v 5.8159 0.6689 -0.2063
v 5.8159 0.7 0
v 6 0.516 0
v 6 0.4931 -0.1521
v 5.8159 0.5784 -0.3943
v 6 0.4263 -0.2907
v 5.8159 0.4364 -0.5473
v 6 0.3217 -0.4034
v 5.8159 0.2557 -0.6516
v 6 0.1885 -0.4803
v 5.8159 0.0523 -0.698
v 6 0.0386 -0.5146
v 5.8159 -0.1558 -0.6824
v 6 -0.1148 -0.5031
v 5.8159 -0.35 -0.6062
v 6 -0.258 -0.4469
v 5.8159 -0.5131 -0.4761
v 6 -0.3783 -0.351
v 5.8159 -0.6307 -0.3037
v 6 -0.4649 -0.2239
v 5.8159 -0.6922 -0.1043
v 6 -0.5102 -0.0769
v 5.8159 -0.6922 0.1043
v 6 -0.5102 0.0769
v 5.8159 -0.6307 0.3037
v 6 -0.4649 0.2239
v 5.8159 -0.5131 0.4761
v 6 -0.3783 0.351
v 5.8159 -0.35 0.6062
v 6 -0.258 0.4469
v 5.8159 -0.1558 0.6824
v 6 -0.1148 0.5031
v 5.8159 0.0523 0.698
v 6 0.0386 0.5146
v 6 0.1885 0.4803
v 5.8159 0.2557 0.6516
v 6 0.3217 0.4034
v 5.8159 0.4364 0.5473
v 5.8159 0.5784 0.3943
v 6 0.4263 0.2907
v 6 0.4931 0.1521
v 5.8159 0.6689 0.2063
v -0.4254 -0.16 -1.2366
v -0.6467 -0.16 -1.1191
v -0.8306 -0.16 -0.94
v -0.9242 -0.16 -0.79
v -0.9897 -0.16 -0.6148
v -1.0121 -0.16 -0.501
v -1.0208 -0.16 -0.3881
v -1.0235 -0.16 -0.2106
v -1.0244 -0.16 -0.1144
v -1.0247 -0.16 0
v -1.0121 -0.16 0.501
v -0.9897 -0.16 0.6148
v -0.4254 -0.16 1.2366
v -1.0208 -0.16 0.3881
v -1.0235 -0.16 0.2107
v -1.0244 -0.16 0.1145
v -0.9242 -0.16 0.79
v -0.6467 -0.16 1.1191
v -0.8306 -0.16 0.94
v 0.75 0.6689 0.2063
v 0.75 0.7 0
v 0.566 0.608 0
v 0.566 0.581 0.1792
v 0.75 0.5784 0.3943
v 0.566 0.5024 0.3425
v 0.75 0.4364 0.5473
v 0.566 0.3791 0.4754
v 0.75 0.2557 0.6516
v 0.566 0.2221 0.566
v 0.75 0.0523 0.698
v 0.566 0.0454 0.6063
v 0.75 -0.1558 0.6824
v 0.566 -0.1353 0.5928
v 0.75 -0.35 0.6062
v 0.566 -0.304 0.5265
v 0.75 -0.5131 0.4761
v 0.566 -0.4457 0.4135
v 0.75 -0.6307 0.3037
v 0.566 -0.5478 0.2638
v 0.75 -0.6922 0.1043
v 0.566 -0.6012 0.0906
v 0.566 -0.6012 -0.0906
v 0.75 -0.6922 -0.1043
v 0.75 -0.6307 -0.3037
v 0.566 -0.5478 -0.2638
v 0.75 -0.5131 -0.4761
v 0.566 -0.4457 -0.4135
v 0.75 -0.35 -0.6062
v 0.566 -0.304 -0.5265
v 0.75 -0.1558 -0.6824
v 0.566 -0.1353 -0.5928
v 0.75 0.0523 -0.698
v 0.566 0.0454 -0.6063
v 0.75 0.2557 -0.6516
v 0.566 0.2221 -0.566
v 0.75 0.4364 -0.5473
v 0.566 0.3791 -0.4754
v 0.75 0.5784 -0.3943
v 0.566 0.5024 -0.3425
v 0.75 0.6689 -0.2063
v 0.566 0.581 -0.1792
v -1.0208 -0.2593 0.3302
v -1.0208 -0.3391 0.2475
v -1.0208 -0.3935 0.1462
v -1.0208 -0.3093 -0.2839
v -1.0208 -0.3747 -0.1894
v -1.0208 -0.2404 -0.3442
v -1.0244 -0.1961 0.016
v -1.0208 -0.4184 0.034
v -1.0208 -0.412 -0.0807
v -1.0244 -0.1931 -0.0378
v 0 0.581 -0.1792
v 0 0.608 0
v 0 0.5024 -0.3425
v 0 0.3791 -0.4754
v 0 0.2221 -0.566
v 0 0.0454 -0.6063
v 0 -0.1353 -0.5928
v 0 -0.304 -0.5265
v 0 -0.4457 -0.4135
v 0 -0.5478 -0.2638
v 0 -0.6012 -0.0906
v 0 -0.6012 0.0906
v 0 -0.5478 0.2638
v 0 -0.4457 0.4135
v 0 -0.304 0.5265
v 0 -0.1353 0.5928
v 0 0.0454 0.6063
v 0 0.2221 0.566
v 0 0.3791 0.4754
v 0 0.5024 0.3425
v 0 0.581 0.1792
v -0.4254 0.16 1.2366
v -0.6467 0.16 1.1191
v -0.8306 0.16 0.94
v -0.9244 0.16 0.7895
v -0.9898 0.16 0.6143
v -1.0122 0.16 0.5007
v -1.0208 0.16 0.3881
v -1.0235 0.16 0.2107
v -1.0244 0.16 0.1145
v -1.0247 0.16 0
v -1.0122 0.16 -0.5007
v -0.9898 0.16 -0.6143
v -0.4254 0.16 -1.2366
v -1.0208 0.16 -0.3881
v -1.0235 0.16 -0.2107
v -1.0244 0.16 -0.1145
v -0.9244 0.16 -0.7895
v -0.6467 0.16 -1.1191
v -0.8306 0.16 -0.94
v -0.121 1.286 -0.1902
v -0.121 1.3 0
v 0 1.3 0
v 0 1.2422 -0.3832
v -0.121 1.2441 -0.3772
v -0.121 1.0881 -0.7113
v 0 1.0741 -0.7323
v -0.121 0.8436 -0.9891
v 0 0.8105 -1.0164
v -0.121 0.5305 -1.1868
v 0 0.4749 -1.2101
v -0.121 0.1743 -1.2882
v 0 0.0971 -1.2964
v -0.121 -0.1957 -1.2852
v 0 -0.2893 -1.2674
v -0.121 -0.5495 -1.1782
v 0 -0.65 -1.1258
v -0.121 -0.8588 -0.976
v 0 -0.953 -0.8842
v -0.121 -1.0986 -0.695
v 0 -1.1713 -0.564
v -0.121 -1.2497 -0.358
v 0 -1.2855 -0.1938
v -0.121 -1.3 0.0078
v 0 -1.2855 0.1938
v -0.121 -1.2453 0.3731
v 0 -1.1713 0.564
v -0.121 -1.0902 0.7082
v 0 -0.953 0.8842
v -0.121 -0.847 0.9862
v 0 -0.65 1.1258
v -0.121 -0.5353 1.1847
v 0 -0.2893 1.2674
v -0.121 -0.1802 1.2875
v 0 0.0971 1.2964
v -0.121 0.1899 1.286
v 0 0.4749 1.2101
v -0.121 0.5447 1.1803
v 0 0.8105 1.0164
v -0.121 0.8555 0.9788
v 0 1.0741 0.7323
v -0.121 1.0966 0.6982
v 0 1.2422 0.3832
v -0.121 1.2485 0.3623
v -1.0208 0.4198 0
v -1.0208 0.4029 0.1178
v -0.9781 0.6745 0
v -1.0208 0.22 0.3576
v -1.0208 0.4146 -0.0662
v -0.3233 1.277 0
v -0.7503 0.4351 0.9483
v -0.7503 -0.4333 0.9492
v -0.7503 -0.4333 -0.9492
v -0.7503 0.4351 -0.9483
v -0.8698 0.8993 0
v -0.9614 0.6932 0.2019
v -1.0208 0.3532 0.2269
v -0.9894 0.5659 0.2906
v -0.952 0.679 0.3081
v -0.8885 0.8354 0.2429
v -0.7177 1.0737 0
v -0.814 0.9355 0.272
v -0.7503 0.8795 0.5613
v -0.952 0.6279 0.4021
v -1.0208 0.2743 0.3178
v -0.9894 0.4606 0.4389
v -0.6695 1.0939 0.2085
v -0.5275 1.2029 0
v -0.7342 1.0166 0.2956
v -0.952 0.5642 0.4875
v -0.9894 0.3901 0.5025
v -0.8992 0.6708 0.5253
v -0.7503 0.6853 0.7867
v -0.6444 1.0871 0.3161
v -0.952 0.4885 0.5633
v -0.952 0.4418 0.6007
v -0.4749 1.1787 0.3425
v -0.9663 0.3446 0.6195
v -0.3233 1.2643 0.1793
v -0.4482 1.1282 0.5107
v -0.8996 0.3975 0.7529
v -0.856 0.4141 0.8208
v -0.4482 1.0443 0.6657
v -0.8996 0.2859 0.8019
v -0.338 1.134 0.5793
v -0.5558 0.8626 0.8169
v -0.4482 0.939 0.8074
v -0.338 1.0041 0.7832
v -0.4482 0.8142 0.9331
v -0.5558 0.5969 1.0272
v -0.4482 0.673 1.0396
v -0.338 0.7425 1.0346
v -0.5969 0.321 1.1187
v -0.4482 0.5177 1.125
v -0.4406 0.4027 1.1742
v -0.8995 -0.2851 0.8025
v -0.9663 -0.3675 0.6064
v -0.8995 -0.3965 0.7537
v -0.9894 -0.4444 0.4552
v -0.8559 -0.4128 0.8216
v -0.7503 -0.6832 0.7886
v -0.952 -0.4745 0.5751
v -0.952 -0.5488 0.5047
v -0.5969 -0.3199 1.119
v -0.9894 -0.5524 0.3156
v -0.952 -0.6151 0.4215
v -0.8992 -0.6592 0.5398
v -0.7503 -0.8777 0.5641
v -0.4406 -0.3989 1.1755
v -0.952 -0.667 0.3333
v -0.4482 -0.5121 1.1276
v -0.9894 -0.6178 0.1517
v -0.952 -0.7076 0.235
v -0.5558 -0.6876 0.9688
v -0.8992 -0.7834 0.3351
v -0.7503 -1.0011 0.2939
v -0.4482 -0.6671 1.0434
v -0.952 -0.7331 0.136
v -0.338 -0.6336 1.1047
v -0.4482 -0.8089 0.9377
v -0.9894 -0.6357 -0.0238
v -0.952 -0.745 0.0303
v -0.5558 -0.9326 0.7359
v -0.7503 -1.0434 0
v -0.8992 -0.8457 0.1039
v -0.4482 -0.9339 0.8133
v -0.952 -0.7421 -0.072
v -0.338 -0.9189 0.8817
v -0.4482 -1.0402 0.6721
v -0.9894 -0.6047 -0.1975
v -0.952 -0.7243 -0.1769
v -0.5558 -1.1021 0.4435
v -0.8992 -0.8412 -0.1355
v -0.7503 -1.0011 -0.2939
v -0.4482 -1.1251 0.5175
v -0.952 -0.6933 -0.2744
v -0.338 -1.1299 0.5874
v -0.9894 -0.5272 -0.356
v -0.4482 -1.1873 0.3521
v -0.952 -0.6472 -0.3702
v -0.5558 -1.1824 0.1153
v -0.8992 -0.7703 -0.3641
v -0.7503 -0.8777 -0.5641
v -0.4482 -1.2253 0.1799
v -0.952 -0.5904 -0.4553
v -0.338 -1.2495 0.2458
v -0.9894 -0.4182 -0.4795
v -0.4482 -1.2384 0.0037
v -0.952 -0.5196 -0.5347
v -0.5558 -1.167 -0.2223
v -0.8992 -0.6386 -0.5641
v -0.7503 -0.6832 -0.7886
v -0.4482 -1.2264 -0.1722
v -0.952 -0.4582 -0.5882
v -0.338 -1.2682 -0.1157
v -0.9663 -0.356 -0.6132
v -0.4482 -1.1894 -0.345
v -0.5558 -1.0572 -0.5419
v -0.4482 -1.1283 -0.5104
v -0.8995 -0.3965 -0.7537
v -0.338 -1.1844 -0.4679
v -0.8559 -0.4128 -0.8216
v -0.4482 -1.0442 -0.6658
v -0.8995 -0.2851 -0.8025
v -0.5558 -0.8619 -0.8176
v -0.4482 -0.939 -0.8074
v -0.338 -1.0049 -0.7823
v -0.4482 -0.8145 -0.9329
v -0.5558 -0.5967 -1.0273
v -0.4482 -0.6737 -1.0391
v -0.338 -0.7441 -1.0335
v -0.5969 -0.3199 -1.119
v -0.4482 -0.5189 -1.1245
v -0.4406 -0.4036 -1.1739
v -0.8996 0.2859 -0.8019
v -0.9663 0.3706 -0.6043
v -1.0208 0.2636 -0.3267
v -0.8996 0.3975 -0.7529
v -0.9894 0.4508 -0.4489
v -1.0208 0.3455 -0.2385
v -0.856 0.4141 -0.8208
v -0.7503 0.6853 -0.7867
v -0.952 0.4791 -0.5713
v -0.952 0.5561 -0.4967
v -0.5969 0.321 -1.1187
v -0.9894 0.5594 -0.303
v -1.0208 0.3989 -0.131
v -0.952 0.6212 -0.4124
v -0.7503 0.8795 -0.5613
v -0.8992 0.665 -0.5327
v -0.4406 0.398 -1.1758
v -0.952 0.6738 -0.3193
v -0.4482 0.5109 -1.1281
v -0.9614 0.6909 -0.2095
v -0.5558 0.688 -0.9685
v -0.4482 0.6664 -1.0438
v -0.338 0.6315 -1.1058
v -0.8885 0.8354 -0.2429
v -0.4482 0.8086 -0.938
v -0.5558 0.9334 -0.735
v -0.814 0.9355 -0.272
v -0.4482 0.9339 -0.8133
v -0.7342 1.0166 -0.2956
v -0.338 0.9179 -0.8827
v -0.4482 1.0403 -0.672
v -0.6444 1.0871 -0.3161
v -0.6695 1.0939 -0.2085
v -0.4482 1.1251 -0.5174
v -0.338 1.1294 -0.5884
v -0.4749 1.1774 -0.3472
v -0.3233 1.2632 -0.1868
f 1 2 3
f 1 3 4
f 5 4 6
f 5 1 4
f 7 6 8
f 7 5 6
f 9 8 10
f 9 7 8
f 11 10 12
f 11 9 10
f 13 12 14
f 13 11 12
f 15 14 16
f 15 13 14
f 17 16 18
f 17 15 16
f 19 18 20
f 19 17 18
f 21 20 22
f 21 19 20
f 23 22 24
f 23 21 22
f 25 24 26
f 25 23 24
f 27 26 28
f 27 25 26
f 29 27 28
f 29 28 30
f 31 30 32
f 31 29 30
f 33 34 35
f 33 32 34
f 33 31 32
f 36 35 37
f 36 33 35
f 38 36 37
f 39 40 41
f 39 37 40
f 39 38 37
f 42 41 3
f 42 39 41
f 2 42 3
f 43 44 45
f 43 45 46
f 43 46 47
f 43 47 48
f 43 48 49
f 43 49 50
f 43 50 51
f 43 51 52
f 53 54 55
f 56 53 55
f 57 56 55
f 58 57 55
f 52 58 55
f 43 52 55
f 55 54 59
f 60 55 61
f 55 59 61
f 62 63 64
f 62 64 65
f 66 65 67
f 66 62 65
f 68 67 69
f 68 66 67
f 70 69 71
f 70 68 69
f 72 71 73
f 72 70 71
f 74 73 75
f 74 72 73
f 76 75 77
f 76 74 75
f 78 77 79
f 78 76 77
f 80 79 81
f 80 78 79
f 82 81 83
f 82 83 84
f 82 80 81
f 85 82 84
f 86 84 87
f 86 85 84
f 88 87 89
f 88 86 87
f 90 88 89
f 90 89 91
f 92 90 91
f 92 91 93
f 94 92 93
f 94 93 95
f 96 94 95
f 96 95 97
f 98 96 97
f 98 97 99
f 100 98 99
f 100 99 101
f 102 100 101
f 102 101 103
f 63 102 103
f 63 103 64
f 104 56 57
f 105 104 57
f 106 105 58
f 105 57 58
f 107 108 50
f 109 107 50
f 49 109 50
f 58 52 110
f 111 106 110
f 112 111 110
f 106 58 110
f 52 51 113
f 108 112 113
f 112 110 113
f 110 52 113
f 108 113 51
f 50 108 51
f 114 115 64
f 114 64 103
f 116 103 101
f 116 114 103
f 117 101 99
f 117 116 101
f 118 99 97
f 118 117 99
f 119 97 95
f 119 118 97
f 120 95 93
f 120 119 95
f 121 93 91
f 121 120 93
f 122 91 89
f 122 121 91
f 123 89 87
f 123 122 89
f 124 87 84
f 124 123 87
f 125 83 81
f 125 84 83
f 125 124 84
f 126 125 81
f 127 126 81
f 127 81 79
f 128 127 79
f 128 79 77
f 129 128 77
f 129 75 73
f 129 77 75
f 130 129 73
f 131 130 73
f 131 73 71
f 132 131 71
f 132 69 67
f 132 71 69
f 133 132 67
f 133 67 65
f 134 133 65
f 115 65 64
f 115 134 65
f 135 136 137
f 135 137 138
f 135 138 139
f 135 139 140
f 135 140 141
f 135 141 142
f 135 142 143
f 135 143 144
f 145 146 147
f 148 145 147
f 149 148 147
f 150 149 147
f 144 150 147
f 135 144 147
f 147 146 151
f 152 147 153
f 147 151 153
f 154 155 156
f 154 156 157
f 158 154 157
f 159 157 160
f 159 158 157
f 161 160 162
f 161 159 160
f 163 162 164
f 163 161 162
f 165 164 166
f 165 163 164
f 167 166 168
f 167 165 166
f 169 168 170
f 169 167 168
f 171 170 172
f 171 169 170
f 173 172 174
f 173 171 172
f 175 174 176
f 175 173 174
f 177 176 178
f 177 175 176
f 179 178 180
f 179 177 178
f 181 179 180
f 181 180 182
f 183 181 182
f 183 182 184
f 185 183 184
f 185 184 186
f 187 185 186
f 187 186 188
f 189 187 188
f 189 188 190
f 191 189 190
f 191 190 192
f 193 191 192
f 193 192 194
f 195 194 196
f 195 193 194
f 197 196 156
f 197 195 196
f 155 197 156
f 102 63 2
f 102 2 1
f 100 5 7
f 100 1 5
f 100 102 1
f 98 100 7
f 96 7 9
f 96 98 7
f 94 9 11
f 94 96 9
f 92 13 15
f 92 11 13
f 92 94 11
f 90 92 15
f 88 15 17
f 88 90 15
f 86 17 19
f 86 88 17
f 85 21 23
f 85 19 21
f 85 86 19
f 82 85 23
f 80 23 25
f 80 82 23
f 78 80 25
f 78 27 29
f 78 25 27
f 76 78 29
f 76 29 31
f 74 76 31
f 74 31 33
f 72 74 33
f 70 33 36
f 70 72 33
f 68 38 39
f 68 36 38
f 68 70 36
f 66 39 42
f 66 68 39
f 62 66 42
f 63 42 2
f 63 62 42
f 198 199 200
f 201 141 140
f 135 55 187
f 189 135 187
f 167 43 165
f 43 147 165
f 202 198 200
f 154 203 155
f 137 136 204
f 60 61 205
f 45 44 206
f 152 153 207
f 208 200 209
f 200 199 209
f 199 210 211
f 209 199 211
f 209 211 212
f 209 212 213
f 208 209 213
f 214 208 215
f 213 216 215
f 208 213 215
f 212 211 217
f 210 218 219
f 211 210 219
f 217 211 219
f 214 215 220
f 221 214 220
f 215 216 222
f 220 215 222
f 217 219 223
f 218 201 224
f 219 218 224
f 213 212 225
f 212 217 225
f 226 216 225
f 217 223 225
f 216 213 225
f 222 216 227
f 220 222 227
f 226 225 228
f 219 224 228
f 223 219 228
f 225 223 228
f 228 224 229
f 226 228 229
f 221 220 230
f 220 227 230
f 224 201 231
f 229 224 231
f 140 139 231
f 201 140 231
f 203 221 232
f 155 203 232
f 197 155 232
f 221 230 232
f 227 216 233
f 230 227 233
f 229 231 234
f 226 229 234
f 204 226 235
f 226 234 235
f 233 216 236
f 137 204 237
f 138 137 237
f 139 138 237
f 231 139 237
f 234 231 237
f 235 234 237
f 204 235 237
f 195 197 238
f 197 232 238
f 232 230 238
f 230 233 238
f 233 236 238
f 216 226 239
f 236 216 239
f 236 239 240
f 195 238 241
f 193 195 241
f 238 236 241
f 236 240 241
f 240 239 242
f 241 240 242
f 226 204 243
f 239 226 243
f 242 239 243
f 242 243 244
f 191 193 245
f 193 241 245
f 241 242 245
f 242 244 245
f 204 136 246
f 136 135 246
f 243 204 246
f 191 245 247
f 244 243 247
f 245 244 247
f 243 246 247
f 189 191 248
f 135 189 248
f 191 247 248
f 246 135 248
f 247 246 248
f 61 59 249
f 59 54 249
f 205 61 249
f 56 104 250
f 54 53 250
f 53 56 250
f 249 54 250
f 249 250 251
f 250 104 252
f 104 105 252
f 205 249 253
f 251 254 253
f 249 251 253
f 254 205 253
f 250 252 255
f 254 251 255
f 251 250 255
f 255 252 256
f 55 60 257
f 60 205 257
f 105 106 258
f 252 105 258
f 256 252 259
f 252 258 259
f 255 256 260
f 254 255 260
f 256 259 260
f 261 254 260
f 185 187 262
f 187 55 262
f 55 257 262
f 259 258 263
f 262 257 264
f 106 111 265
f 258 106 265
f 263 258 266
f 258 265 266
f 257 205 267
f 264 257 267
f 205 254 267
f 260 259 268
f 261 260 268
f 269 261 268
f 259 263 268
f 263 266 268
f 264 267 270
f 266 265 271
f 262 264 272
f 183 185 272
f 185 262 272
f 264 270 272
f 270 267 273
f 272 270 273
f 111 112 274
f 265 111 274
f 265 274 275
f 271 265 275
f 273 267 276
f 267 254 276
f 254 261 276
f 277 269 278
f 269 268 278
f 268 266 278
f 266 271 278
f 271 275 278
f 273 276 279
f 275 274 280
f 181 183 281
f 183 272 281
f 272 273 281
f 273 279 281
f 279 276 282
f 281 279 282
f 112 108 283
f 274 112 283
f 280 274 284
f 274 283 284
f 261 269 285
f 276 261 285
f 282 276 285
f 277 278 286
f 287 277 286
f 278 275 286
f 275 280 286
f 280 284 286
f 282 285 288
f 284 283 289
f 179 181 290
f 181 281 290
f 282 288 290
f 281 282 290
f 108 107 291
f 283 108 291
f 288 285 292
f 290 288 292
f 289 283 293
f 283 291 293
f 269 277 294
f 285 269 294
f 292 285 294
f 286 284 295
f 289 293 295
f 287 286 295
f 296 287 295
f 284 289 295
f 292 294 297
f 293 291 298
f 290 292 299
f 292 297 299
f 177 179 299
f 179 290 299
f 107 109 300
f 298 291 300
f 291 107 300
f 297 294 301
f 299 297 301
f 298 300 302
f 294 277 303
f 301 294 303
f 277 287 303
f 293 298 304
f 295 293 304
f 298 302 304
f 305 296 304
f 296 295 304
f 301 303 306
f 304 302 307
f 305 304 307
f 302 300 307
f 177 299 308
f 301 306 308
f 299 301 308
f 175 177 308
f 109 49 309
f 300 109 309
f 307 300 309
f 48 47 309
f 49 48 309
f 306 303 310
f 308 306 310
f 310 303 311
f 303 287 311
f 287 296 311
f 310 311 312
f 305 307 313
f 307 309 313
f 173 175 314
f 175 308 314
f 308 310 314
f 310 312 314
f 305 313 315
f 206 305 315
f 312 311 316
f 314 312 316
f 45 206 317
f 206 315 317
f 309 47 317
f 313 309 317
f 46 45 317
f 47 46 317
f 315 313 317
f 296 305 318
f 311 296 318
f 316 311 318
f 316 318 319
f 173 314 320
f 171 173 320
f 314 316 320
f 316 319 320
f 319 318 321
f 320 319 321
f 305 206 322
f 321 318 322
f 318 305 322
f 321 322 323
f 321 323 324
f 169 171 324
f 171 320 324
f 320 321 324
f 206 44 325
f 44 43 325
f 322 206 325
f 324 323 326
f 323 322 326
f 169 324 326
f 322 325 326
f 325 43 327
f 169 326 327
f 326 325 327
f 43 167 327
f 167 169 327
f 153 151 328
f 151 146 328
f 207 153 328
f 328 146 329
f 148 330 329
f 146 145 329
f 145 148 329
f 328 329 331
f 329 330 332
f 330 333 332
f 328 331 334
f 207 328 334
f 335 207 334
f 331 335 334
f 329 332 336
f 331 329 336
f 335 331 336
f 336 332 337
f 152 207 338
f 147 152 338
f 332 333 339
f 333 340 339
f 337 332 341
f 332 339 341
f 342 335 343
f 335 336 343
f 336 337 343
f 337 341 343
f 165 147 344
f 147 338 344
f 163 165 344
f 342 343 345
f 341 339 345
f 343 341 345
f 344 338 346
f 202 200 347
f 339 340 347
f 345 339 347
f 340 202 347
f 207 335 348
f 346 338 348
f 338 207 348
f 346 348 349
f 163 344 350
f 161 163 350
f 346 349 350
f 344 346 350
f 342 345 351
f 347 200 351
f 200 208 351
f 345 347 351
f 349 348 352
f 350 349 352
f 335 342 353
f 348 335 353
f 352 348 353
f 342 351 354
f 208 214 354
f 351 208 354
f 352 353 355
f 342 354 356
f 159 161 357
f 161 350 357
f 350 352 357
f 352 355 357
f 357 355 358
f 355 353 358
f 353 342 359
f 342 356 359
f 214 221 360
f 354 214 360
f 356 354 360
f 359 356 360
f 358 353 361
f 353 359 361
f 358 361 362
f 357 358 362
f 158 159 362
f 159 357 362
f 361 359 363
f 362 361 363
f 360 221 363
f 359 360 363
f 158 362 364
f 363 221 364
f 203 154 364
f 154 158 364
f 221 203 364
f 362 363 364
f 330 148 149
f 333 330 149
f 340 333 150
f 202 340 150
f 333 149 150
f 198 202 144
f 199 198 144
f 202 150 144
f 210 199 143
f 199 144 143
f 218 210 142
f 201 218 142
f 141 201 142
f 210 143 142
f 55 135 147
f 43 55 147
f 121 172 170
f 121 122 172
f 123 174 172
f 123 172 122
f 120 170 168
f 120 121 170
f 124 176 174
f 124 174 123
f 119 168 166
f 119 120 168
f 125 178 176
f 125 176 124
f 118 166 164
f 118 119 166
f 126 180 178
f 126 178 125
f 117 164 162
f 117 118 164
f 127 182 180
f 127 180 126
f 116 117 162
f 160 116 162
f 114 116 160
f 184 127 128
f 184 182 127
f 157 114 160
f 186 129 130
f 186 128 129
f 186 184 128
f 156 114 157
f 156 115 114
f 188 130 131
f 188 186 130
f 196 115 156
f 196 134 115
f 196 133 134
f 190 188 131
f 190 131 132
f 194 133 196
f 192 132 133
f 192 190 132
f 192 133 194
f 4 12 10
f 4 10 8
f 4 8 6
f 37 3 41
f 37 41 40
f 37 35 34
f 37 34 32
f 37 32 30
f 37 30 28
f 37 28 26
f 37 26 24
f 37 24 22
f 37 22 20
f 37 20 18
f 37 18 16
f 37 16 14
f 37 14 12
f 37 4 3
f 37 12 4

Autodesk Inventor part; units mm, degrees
ref_plane "YZ Plane" through (0, 0, 0) normal (1, 0, 0) x (0, 1, 0)
sketch "Sketch1" plane through (0, 0, 0) normal (0, 0, 1) x (1, 0, 0)
  line L0 (-1.0254, 0) -> (6, 0)
  line L1 (6, 0) -> (6, 0.7)
  line L2 (6, 0.7) -> (0.75, 0.7)
  line L3 (0.75, 0.7) -> (0.566, 0.608)
  line L4 (0.566, 0.608) -> (0, 0.608)
  line L5 (0, 0.608) -> (0, 1.3)
  line L6 (-4.8605, 0) -> (21.908, 0) projected
  line L7 (0, -0.26) -> (0, 1.5602) projected
  line L8 (0, 1.3) -> (-0.9811, 1.2998)
  arc A0 (-0.9811, 1.2998) -> (-1.0254, 0) centre (18.0839, 0) ccw
  dimension "d0" = 6
  dimension "d1" = 5.25
  dimension "d2" = 0.184
  dimension "d3" = 1.0254
  dimension "d4" = 1.4
  dimension "d5" = 1.216
  dimension "d9" = 2.6
  dimension "d10" = 0.01
  dimension "d15" = 19.1093
revolve "Body" add sketch "Sketch1" angle 360 about axis through (-1.0254, 0, 0) along (1, 0, 0)
fillet "Fillet1" radius 0.9 1 edges at (-0.9811, -1.2998, 0)
ref_plane "IDS_WORKPLANE{1}" through (-1.0254, 0, 0) normal (1, 0, 0) x (0, 0, -1)
sketch "Sketch2" plane through (-1.0254, 0, 0) normal (1, 0, 0) x (0, 0, -1)
  line L0 (0, -1.82) -> (0, 1.82) projected
  line L1 (1.82, 0) -> (-1.82, 0) projected
  line L2 (-1.3, 0.16) -> (1.3, 0.16)
  line L3 (1.3, 0.16) -> (1.3, -0.16)
  line L4 (1.3, -0.16) -> (-1.3, -0.16)
  line L5 (-1.3, -0.16) -> (-1.3, 0.16)
  line L6 (0, 0.16) -> (0, -0.16) construction
  line L7 (-1.3, 0) -> (1.3, 0) construction
  circle A0 centre (0, 0) radius 1.3 projected
  dimension "d17" = 0.32
extrude "Slot" cut sketch "Sketch2" along normal blind 0.6 contours L4 A0 L1 L0 | L0 L1 A0 L4 | L4 L5 A0 | A0 L3 L4 | L1 A0 L2 L0 | L0 L2 A0 L1 | L5 L2 A0 | A0 L2 L3
thread "Thread" size "M1.4x0.3" class "6g" standard "ISO Metric profile" length 5.25
chamfer "Chamfer1" distance 0.184 distance2 0.1841 1 edges at (6, -0.7, 0) measured on face at (6, 0.4293, -0.1327)
ref_plane "Work Plane2" through (8.25, 0, 0) normal (0, 0, -1) x (1, 0, 0)
equation "\"d17\" = SBR"
equation "\"d18\" = STI"
equation "\"d20\" = RR"
equation "\"d11\" = GEL"
equation "\"d13\" = -0.5 * SPD + 0.5 * GD"
equation "\"d0\" = NLG"
equation "\"d1\" = GEL"
equation "\"d2\" = GAL"
equation "\"d3\" = KOH"
equation "\"d4\" = GD"
equation "\"d5\" = BDM"
equation "\"d9\" = KOD"
equation "\"d10\" = KEWI"
equation "\"GD\" = NND"
equation "\"NLG\" = 6"
equation "\"GEL\" = 5.25"
equation "\"KOD\" = 2.6"
equation "\"KOH\" = 1.02539"
equation "\"GAL\" = 0.61345 * PTC"
equation "\"SPD\" = NND - 1.2269 * PTC"
equation "\"BDM\" = 1.216"
equation "\"GUL\" = 0.61345 * PTC"
equation "\"RR\" = 0.9"
equation "\"SBR\" = 0.32"
equation "\"STI\" = 0.6"
equation "\"KEWI\" = 0.01deg"
equation "\"KR\" = 1.6"
equation "\"d16\" = -KOH"
equation "\"PTC\" = 0.3"
equation "\"THREADDIA\" = 1.4"
equation "\"TOA\" = 30deg"
equation "\"NND\" = 1.4"
equation "\"ORI\" = 0.9"
equation "\"GD1\" = THREADDIA - 1.2269 * PTC"
properties part number "CNS 9671 - M1,4 x 6" material "Steel, Mild"
